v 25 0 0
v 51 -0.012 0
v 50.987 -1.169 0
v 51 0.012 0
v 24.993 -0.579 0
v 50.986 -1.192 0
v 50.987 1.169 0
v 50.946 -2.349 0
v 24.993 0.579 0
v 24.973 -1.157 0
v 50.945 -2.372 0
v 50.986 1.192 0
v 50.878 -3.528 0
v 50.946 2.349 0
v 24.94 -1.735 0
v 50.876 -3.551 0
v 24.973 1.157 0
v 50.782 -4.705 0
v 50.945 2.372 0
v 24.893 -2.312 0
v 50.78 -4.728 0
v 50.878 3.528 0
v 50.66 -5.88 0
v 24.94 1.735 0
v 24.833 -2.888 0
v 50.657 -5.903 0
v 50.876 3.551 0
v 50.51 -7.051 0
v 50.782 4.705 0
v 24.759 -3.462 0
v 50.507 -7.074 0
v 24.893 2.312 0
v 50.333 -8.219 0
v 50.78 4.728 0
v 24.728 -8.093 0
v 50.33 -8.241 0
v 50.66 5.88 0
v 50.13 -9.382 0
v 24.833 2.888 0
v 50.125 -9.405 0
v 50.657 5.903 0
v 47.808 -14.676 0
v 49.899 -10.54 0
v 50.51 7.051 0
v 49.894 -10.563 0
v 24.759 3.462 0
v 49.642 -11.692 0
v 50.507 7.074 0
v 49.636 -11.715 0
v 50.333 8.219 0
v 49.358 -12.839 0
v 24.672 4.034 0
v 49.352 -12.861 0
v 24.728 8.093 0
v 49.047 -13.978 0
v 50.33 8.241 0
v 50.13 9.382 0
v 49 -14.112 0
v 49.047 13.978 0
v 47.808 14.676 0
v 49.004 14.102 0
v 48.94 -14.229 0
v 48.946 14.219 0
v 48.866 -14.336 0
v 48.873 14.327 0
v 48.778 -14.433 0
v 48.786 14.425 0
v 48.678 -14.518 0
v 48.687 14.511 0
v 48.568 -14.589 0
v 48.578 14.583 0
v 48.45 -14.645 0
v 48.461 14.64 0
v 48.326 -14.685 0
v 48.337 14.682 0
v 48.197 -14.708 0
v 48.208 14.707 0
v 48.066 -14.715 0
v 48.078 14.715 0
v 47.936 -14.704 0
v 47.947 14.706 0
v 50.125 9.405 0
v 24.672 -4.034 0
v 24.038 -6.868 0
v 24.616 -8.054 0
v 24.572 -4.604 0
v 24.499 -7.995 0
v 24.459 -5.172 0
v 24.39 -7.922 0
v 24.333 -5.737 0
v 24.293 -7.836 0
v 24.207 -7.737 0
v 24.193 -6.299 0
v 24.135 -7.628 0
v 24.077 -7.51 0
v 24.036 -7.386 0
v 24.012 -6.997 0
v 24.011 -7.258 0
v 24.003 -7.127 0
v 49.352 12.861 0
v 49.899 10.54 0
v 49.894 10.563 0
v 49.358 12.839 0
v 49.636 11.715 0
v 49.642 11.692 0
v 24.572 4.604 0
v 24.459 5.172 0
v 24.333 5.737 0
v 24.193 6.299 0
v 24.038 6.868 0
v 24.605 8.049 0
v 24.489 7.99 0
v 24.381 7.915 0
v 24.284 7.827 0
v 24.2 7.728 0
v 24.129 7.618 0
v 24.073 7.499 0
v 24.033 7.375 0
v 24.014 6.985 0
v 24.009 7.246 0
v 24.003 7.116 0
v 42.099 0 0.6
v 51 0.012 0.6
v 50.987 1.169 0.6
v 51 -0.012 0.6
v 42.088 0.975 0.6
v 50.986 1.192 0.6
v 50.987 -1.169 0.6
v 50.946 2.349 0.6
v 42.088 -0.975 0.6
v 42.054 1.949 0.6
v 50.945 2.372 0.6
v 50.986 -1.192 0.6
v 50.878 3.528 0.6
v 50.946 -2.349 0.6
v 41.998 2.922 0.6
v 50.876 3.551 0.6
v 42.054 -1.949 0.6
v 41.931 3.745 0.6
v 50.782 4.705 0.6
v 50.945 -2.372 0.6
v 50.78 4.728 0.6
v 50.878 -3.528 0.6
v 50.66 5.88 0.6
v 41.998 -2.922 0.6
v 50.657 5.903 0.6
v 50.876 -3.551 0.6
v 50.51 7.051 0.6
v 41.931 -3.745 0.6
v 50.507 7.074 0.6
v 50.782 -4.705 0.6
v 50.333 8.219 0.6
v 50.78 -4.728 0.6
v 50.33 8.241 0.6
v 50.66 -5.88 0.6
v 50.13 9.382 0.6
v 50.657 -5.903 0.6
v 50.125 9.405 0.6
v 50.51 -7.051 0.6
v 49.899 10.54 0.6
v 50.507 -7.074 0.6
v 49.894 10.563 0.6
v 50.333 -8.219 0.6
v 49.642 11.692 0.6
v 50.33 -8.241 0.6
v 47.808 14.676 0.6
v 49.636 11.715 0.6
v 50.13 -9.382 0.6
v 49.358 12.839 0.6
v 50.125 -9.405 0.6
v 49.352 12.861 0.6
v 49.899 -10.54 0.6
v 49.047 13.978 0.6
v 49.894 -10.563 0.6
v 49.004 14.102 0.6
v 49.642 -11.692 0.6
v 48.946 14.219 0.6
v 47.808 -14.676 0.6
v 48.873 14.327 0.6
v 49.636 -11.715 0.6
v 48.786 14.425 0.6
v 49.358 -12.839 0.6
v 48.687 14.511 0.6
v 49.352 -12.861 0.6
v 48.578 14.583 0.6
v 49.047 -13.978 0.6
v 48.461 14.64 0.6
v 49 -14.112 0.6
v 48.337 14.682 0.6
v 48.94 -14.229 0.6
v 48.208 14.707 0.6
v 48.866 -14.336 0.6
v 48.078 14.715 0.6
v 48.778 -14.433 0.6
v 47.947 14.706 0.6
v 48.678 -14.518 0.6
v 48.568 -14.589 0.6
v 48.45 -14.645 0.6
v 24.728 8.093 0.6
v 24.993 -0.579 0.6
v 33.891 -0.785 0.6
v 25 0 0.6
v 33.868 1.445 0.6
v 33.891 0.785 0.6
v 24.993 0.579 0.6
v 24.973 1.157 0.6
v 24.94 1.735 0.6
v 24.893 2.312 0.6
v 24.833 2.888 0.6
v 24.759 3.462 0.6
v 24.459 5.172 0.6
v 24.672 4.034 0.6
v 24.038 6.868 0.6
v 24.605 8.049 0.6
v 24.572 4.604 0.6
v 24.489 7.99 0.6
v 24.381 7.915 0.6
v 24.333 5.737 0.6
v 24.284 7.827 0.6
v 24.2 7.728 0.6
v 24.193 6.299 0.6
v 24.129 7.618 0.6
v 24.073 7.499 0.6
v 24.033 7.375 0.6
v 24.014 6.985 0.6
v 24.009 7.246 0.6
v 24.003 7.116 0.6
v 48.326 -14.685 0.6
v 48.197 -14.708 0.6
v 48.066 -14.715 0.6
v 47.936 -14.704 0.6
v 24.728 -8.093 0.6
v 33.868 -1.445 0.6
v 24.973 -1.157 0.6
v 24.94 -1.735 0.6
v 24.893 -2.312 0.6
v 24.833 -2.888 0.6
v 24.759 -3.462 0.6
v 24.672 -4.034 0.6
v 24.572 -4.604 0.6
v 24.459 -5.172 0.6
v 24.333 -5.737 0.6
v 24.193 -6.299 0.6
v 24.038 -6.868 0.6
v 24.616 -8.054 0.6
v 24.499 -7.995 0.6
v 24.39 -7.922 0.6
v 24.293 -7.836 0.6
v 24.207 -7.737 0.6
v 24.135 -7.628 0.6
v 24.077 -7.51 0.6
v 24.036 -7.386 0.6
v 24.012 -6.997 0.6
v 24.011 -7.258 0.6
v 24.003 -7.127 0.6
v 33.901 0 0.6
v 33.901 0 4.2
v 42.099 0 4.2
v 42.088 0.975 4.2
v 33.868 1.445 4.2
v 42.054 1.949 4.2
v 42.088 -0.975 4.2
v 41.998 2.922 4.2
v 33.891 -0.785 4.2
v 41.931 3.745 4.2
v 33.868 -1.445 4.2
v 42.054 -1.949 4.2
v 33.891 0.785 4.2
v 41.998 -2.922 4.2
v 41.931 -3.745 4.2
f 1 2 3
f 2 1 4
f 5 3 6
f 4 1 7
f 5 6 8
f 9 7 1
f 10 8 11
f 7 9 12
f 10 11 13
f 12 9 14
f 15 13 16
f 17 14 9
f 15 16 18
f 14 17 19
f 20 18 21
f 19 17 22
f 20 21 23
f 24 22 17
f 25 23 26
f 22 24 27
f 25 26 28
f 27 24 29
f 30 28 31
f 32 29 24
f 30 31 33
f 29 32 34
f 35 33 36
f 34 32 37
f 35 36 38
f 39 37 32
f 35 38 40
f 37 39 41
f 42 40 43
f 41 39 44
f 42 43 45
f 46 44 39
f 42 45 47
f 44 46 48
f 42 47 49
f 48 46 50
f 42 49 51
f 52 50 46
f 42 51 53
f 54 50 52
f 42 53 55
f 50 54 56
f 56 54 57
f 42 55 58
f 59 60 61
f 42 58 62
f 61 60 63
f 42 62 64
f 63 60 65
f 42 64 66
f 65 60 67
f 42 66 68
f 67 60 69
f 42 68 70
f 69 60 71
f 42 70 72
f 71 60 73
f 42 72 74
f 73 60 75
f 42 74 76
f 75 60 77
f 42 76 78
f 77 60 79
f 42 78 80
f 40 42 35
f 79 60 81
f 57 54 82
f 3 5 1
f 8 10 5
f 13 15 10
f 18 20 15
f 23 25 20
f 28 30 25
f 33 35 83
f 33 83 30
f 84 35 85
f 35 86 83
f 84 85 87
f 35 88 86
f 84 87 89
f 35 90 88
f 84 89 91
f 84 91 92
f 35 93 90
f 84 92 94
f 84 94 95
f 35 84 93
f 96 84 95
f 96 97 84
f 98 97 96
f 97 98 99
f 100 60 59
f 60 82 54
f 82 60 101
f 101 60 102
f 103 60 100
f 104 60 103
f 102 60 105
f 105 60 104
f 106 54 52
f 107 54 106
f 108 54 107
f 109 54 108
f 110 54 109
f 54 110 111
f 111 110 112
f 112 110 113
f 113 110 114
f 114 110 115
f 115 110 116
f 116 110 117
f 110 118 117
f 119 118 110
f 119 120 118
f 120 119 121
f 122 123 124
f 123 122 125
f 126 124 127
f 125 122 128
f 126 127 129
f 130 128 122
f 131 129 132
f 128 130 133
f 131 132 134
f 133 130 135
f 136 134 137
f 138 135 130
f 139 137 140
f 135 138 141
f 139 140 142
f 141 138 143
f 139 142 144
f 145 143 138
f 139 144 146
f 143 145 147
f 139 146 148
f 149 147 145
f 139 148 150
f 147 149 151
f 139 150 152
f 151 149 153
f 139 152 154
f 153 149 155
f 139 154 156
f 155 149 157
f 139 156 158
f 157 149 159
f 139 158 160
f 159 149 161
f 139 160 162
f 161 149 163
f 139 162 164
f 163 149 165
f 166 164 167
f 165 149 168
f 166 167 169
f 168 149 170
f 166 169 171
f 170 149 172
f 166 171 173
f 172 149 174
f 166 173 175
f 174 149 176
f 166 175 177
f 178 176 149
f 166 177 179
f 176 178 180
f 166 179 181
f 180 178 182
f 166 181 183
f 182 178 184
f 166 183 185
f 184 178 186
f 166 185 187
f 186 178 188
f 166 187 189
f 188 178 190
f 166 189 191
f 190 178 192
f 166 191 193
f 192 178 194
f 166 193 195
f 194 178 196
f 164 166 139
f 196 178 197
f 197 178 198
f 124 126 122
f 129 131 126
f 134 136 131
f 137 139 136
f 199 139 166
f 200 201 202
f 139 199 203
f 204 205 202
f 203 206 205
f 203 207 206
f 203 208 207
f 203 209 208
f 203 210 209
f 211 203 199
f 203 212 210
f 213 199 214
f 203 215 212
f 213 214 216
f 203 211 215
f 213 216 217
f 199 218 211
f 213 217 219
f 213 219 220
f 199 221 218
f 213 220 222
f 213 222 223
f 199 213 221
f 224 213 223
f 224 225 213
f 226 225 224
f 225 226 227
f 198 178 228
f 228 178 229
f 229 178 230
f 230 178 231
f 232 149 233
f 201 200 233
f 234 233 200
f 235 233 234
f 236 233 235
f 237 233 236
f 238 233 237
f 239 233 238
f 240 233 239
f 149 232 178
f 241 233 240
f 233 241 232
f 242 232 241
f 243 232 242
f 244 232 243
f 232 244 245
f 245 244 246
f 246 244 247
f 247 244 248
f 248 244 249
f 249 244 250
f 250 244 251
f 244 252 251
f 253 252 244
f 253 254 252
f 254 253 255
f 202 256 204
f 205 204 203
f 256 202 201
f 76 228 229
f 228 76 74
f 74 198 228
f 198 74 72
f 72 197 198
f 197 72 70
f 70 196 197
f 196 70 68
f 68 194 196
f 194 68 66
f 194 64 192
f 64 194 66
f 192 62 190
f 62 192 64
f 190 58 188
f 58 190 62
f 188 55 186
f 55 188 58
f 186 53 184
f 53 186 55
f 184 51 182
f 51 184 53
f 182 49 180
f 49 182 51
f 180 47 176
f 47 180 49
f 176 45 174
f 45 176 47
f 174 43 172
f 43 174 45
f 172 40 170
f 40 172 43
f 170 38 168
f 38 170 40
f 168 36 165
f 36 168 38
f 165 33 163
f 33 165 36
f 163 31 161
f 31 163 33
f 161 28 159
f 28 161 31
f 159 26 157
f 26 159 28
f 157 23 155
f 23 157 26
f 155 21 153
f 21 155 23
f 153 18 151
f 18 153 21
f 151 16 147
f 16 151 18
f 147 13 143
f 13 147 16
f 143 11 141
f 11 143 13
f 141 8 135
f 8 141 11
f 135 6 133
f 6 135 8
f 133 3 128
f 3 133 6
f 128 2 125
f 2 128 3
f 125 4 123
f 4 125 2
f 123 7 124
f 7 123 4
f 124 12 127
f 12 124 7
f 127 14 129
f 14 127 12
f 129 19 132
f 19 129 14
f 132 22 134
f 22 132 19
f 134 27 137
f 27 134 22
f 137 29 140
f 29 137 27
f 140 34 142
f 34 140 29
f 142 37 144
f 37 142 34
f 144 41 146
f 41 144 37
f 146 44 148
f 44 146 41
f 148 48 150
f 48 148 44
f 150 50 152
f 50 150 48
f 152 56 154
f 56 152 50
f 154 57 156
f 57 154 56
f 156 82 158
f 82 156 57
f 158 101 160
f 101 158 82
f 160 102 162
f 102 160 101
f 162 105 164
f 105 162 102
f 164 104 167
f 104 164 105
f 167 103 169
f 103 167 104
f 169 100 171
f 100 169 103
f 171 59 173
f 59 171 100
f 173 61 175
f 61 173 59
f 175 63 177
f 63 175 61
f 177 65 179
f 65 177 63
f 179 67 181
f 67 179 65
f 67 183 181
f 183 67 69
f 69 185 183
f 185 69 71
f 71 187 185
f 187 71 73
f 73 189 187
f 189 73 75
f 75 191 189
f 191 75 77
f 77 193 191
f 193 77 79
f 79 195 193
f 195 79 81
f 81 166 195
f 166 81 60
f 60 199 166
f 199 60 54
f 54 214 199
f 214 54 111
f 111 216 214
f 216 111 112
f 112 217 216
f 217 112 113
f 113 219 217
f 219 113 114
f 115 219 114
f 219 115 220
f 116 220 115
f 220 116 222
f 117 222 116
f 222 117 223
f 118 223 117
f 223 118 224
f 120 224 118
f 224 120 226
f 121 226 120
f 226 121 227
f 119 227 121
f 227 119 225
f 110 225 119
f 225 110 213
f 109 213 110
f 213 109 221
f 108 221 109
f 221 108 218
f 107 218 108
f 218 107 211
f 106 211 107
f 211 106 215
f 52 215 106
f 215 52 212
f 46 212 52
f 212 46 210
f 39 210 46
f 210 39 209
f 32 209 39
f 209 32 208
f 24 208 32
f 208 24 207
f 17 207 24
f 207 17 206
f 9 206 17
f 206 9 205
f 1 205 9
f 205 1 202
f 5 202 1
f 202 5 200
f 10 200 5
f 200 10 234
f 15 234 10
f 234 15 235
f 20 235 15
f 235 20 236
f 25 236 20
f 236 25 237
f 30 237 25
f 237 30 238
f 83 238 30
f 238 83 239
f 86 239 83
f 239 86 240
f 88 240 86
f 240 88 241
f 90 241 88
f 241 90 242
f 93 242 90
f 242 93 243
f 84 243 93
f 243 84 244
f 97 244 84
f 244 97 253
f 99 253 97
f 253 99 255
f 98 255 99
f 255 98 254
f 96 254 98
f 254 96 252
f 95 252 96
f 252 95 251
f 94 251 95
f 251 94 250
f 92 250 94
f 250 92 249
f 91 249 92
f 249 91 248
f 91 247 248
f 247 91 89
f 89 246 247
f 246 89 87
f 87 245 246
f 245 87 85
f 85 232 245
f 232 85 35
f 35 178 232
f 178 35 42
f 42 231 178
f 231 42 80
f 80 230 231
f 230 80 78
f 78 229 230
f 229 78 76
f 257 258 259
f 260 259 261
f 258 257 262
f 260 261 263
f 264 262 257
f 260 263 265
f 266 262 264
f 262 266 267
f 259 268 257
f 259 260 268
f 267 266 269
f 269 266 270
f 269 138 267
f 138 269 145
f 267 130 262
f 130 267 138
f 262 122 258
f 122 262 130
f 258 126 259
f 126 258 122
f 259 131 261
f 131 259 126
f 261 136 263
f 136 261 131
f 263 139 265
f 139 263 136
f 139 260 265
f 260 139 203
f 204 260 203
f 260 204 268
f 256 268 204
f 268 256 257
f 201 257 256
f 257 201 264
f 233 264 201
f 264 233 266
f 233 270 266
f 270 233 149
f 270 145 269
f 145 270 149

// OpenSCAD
// file: parameters.scad
// =============================================================================
// Gen-BE — nightly 2026-10-03 (physics_scorer, honest magpylib watts)
// Clocking 0 deg (magnets N facing S) + D-flat keyed bore + index notch + flip-symmetric braces/bolts.
// Windable 2-piece bobbin; turns = physics_scorer turns_fit; copper only between flanges.
// former_web = 3.60 mm (taller copper vs Gen-BA 2.46) — gap grows with web (honest Bz tradeoff).
// Steel back-iron: two buyable mild-steel discs behind each rotor (score with --back-iron).
// =============================================================================
topology            = "dual_rotor";

// --- Wire / winding (physics_scorer winding-fit) -------------------------------
wire_awg            = 26;
wire_od             = 0.45;     // insulated OD mm (bare 0.405)
fill_realistic      = 0.60;     // insulated-wire area / window, hand-wound layered
turns               = 107;       // = physics_scorer turns_fit (do NOT raise)
coil_former_type    = "bobbin";
coil_core_inset     = 7.90;     // radial copper build: hub = copper boundary inset by this
wind_build_axial    = 0.0;      // nothing proud of the flanges
wind_build_radial   = 0.0;

// --- Bobbin (base + lid) ---------------------------------------------------------
coil_id_r           = 26.00;    // copper boundary sector (over the magnet track)
coil_od_r           = 50.00;
span_deg            = 31.84;    // = pitch - 2*asin((wall+0.85)/coil_id_r) -> >=1.2 mm stator web
former_web          = 3.60;     // copper height between flanges
flange_t            = 0.60;
wall                = 1.00;     // flange lip beyond copper
former_bare_h       = former_web + 2 * flange_t;
coil_envelope_h     = former_bare_h + 2 * wind_build_axial;
tab_w               = 7.0;
tab_len             = 7.0;
tab_h               = former_bare_h / 2;
pin_d               = 1.9;      // 1.75 mm filament locating pin
coil_mount_r        = coil_od_r + 0.2 + 4.0;
lead_y              = 1.6;
lead_slot_w         = 0.9;
lead_groove_d       = 0.6;

// --- Gap -------------------------------------------------------------------------
run_clear           = 0.50;     // rotor face -> flange
gap_spacer_h        = run_clear + wind_build_axial;
m2m                 = coil_envelope_h + 2 * run_clear;

// --- Stator ----------------------------------------------------------------------
coil_stations       = 9;
bay_clear           = 0.25;
stator_thick        = former_bare_h;                        // bobbins flush both faces
stator_od           = 158.0;
shaft_clear_stator  = 14.0;     // stator is static; shaft only

// --- Rotor(s) --------------------------------------------------------------------
magnet_Br           = 1.43;     // N52
halbach_magnetisation = "diametric"; // O5x5 assist magnets MUST be DIAMETRICALLY magnetised (tangential)
rotor_b_same_axis   = true;     // same-index magnets share one axis: N faces S across the gap
large_pocket_d      = 20.3;
small_pocket_d      = 5.3;
pocket_h            = 5.2;
large_n             = 8;
R_large             = 38.0;
R_small_inner       = 24.0;
R_small_mid         = 38.0;
R_small_outer       = 55.0;
carrier_od          = 156.0;
carrier_thick       = 7.5;
hub_h               = 10.0;
hub_od              = 30.0;
rotor_b_offset_deg  = 0.0;      // CLOCKING: magnets directly opposite
shaft_key           = "dflat";
dflat_depth         = 0.5;      // 8 mm shaft with 0.5 mm flat (7.5 across flat)
index_notch_d       = 3.0;

// --- Modular MAX interface (Gen-E family) -----------------------------------------
shaft_bore          = 8.35;
dflat_x             = 4.0 - dflat_depth + (shaft_bore - 8.0) / 2;
bearing_d           = 21.85;
bearing_h           = 7.2;
m3_clear            = 3.5;
bolt_r_inner        = 30.0;
bolt_n_inner        = 4;
bolt_inner_angles   = [22.5, -22.5, 157.5, 202.5];  // between poles, flip-symmetric
flange_bolt_r       = 72.0;
flange_bolt_n       = 6;
brace_r             = 68.0;
brace_d             = 4.3;
brace_n             = 4;
brace_angles        = [45, 135, 225, 315];          // flip-symmetric

spacer_pad_od       = 14.0;
spacer_pad_id       = m3_clear;
endbell_od          = 158.0;
endbell_thick       = 8.0;
endbell_shaft_clear = 10.0;
plate_max_mm        = 410;

$fn = 64;
// main file
// Gen-BE — bobbin BASE (bottom flange + hub). Print x9. Wind 26 AWG x 107 t around the hub
// with the LID glued on (coil_lid.stl). Copper lives ONLY between the flanges (no proud winds).
include <parameters.scad>;
$fn = 48;
module sector_2d(r_in, r_out, ang) {
    polygon([
        for (a = [-ang/2 : ang/24 : ang/2]) [r_in*cos(a), r_in*sin(a)],
        for (a = [ang/2 : -ang/24 : -ang/2]) [r_out*cos(a), r_out*sin(a)]
    ]);
}
module footprint_2d() { offset(r=wall) sector_2d(coil_id_r, coil_od_r, span_deg); }
module hub_2d()       { offset(delta=-coil_core_inset) sector_2d(coil_id_r, coil_od_r, span_deg); }

difference() {
    union() {
        linear_extrude(flange_t) footprint_2d();
        translate([0, 0, flange_t - 0.01]) linear_extrude(former_web + 0.01) hub_2d();
    }
    // (no slot in the base: both leads leave through the lid's grooves on the stator +Z side)
}
